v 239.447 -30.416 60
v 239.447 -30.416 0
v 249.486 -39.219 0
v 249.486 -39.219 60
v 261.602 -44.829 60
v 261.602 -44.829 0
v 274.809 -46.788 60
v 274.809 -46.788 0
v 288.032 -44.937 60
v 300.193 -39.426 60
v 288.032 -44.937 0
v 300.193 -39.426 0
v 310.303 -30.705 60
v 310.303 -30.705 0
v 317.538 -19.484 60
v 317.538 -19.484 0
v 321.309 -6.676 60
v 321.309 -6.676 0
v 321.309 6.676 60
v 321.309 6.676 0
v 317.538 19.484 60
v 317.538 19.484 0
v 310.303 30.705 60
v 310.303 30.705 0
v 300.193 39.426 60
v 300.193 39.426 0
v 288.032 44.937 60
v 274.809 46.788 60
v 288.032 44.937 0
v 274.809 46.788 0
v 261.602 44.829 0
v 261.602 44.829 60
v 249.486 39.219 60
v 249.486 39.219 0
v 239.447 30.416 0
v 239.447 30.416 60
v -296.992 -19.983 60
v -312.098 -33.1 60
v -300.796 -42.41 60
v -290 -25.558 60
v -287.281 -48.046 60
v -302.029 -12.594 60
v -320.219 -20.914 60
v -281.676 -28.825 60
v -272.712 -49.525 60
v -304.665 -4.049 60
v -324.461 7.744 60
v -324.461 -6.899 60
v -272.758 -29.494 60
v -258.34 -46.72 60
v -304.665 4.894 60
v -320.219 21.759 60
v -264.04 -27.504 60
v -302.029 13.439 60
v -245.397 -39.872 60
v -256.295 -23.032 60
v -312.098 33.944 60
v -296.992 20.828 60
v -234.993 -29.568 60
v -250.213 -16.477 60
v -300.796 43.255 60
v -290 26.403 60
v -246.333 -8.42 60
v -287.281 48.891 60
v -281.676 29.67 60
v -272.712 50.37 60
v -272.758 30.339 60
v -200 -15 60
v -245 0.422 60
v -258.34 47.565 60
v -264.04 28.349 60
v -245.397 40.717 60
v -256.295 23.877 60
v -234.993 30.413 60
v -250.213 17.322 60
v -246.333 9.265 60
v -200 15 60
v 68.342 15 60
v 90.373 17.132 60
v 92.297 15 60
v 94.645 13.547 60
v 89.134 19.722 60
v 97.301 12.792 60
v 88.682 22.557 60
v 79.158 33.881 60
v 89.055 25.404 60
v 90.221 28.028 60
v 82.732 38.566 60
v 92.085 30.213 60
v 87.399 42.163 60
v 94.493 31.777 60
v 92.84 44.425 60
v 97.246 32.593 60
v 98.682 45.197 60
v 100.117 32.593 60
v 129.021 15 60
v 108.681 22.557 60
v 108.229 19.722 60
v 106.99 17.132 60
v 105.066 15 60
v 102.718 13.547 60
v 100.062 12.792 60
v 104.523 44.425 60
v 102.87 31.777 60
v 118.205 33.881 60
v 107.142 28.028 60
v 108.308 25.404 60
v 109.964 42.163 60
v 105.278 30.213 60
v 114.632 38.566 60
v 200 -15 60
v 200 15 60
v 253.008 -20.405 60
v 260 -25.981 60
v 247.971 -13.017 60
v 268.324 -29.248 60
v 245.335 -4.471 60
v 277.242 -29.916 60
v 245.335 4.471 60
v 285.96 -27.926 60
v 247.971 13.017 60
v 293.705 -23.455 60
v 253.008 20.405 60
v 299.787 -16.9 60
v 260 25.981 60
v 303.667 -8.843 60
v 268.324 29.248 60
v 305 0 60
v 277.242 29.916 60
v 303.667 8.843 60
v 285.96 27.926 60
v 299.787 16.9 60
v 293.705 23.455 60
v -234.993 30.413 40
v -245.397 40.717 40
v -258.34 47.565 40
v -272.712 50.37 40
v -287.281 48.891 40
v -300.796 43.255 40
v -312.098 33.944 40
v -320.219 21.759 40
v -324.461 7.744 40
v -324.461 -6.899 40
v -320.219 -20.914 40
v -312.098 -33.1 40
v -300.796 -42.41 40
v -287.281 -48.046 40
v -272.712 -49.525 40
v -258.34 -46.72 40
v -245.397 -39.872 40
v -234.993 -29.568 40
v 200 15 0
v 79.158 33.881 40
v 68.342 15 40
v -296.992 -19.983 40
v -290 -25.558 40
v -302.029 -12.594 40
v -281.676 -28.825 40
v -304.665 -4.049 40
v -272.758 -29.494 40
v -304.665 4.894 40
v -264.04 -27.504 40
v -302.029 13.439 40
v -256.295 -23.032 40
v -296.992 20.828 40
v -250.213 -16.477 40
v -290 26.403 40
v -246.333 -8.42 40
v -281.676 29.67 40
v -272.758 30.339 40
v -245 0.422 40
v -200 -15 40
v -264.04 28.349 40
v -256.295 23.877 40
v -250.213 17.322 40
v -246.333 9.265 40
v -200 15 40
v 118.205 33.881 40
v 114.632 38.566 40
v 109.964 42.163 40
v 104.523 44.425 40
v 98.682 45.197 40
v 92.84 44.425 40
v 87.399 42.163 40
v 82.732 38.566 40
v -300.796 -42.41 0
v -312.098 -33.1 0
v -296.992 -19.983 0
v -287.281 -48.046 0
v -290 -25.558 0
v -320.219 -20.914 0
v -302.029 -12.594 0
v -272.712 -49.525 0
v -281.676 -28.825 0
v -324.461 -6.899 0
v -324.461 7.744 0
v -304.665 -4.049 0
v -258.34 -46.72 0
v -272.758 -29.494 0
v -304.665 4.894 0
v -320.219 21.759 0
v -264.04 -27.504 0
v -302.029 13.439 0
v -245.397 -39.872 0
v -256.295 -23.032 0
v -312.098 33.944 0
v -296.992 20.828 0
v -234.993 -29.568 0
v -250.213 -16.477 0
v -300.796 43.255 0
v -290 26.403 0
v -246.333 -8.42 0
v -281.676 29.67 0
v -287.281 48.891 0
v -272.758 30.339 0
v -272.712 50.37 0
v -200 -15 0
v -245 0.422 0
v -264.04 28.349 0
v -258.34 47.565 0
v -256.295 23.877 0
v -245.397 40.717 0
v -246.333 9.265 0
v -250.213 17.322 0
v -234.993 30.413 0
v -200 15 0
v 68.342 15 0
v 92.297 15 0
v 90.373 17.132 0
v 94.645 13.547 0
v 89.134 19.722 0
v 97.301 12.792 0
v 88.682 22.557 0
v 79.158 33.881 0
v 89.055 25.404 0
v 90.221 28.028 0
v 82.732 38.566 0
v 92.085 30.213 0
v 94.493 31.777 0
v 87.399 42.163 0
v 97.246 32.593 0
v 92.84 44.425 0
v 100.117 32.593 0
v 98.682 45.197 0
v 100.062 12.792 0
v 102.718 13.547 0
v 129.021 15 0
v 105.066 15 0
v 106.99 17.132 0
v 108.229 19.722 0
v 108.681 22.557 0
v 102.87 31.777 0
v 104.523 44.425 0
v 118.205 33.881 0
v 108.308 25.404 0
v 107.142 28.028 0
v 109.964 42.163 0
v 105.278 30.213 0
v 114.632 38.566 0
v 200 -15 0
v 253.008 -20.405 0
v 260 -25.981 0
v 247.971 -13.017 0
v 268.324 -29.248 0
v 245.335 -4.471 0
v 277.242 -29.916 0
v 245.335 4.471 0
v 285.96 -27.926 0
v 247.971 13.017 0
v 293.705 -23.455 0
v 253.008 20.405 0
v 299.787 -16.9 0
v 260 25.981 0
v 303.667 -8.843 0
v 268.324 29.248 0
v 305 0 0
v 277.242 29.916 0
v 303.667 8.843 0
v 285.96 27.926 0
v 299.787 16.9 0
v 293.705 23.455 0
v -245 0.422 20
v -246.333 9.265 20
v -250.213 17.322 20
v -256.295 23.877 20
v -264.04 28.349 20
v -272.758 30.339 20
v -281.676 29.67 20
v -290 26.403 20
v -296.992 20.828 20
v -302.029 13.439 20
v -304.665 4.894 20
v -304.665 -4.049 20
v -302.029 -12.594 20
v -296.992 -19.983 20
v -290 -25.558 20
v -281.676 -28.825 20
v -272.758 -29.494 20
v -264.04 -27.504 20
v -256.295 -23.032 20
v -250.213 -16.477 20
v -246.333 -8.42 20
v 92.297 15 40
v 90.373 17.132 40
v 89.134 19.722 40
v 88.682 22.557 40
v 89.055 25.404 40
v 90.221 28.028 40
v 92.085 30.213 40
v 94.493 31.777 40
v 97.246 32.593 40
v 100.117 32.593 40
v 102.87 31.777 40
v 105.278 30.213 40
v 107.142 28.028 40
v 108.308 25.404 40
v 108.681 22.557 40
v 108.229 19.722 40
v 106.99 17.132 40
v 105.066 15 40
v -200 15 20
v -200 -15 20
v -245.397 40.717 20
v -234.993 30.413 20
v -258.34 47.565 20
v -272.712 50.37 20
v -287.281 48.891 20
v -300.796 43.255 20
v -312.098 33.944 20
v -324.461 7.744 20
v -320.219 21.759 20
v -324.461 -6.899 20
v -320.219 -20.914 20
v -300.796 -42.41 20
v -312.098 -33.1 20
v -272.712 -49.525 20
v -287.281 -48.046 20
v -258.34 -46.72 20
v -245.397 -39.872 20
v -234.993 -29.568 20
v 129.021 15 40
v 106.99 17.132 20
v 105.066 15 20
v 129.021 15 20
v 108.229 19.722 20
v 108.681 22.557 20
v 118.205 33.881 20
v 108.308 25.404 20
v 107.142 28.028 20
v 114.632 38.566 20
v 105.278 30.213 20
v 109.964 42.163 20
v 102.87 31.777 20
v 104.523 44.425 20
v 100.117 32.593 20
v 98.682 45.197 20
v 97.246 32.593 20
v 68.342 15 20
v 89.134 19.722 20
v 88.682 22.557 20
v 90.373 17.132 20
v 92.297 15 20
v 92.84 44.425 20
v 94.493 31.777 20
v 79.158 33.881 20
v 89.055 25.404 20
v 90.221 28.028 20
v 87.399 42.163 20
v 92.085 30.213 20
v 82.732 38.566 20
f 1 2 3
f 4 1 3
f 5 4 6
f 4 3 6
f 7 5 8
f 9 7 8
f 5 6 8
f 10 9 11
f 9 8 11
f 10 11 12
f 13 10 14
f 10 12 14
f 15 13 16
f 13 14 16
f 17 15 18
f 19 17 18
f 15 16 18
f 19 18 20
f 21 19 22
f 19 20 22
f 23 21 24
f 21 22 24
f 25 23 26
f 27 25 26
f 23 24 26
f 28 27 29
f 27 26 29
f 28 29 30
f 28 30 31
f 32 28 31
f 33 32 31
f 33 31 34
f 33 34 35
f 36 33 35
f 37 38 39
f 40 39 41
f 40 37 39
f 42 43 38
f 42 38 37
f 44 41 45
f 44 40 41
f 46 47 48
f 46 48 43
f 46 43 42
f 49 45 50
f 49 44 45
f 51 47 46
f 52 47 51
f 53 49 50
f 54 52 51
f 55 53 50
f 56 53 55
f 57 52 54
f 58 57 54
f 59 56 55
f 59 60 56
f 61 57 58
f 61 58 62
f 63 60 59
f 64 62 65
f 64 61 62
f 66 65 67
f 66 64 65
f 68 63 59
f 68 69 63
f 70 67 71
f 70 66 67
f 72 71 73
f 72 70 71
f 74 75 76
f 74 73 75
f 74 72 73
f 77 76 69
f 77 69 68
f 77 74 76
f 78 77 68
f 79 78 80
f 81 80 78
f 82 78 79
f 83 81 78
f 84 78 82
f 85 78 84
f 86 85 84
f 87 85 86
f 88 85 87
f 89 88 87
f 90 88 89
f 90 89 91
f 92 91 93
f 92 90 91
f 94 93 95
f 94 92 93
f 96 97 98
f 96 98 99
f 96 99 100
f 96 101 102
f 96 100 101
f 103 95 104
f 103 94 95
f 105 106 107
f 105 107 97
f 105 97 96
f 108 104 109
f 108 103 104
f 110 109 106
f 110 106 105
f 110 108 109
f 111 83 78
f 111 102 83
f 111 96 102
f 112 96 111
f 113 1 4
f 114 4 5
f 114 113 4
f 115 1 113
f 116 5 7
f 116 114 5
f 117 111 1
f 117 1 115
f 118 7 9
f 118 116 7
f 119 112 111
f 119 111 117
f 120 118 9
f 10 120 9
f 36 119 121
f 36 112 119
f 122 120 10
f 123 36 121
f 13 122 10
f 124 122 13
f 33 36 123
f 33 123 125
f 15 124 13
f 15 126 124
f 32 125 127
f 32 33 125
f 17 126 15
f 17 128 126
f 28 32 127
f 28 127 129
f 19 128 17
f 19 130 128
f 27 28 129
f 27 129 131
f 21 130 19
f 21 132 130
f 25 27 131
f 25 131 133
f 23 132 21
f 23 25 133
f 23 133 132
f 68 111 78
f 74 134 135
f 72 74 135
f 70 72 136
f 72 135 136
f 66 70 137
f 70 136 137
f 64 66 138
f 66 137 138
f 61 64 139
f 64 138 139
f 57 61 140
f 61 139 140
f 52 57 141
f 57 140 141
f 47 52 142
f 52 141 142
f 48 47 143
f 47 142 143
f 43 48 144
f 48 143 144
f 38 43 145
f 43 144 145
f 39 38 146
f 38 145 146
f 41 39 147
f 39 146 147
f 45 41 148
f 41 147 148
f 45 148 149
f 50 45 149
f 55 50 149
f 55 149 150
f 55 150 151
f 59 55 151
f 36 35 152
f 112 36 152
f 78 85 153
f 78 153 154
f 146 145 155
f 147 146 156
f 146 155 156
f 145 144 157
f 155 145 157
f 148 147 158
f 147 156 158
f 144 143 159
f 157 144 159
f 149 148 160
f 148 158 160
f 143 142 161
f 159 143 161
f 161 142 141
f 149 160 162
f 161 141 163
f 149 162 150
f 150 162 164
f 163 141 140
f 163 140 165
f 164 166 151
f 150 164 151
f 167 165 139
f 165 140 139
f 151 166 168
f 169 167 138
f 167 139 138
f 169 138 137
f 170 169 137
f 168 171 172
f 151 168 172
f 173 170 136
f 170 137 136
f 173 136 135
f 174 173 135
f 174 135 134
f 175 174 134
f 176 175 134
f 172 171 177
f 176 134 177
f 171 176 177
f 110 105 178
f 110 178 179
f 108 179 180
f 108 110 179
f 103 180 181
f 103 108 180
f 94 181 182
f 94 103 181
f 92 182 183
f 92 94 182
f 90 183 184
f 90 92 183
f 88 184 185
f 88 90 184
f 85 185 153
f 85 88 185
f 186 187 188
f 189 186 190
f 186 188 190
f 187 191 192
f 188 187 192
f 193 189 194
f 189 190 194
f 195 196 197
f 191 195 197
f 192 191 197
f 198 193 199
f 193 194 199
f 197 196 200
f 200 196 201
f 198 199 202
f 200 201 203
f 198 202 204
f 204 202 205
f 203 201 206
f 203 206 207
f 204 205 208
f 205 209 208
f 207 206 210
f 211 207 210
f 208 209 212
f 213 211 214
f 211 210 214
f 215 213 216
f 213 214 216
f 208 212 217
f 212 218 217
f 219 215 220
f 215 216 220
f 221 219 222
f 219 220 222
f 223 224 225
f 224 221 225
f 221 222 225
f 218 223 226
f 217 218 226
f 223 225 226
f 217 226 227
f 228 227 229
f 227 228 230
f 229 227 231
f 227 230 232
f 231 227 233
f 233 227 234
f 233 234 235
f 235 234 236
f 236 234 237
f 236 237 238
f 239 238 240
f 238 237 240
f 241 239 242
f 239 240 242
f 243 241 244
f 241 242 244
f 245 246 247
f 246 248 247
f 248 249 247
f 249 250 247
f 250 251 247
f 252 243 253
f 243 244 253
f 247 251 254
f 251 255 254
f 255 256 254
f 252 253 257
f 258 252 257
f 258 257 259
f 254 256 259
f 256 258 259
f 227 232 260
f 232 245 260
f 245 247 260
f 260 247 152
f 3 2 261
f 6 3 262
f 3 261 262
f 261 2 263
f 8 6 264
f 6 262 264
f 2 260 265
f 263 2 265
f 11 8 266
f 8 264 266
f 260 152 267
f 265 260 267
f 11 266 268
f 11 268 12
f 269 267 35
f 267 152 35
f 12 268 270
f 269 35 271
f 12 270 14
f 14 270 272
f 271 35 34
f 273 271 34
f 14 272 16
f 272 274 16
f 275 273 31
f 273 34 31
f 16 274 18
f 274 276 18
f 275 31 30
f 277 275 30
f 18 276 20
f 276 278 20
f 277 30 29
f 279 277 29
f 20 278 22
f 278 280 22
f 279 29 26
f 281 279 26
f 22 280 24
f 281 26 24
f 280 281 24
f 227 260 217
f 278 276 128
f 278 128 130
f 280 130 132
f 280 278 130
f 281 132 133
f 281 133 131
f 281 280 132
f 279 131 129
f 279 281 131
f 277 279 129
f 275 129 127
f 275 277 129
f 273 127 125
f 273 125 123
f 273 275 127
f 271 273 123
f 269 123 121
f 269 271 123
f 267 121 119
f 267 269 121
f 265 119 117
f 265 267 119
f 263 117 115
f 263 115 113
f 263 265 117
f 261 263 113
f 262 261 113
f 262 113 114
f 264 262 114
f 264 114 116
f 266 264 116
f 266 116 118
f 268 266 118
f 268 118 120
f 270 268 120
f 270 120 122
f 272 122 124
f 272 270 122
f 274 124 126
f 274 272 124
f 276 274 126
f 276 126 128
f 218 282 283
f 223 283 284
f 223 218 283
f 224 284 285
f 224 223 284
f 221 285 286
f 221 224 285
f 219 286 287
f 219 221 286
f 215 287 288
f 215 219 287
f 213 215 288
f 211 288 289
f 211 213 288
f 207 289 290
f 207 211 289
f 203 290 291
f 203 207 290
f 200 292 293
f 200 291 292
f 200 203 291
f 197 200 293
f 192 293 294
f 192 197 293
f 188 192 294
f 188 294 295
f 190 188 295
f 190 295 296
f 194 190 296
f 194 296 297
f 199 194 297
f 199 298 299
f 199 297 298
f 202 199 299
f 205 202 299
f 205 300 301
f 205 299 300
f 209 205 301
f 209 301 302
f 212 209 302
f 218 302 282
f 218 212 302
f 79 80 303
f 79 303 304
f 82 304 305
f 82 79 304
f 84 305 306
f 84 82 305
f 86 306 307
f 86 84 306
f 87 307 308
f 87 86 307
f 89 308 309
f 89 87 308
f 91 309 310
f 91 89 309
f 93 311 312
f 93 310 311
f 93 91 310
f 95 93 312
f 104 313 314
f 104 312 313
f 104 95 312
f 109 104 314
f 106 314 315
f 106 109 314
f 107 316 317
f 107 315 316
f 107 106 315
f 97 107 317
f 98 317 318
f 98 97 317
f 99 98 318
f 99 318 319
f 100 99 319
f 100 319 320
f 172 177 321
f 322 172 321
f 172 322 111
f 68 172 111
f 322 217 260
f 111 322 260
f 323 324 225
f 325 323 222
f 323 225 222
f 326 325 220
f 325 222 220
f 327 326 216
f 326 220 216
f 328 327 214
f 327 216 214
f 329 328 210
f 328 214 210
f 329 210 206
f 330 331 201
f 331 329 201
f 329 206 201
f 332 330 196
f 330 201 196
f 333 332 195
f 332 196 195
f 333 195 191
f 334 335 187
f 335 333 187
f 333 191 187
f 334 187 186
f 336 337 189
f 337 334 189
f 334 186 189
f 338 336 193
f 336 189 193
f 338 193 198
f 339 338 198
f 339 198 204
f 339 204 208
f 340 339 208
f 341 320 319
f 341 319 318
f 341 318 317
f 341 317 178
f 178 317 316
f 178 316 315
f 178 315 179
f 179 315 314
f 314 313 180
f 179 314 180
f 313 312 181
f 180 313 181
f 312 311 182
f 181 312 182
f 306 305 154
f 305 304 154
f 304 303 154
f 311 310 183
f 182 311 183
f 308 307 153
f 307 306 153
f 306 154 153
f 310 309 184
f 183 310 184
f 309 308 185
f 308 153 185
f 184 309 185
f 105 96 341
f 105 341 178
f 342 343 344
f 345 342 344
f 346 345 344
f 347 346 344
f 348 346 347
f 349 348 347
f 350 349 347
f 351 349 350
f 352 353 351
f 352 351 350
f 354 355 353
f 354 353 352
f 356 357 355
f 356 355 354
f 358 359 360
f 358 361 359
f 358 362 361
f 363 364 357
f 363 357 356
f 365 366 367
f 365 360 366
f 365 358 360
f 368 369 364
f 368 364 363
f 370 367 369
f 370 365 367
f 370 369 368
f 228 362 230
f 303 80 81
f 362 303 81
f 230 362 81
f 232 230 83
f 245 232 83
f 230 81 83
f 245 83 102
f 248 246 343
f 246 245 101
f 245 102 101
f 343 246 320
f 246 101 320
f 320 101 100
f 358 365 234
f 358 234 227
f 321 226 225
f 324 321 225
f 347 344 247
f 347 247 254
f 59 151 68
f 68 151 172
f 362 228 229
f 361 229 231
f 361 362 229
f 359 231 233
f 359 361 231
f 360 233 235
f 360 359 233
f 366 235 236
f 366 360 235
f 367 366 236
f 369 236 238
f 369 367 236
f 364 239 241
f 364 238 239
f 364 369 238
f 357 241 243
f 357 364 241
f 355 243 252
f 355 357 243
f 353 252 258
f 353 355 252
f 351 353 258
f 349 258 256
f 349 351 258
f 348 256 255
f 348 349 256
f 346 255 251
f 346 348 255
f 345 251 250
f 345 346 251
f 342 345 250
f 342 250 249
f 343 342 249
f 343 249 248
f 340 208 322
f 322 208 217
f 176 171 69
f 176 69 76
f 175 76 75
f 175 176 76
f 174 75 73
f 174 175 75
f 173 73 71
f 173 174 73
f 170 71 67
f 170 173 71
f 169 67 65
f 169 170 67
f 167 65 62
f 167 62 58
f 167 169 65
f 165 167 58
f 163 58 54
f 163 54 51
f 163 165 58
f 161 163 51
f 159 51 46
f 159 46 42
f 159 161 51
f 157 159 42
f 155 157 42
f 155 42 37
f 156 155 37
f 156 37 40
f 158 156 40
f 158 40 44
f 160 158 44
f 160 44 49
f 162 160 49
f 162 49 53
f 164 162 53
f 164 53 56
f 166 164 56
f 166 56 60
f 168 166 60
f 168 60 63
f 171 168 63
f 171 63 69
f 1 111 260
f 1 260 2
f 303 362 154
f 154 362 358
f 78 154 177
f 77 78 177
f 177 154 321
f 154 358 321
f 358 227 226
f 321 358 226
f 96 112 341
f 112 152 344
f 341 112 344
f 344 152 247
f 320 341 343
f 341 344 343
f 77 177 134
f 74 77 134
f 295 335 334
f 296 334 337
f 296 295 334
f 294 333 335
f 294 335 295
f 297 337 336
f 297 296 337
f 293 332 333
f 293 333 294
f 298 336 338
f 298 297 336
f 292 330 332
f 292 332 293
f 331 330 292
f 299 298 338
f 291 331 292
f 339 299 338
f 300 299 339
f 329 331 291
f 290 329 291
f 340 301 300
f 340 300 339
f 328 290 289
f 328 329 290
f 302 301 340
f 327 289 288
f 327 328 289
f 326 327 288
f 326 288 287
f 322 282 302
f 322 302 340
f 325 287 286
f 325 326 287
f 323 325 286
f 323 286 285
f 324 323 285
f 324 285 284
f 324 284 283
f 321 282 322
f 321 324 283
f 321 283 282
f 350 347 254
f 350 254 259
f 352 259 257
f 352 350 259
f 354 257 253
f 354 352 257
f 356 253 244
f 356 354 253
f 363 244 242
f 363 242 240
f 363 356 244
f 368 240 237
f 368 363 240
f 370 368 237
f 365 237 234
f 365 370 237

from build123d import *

# Parameters (mm, degrees)
SKETCH1_R           = 30
BOSS_EXTRUDE1_DEPTH = 60
SKETCH2_W           = 125
SKETCH2_H           = 20
CUT_EXTRUDE1_DEPTH  = 70
BOSS_EXTRUDE2_DEPTH = 60
SKETCH4_R           = 10
CUT_EXTRUDE2_DEPTH  = 61
SKETCH5_W           = 20
SKETCH5_H           = 30.196617065
CUT_EXTRUDE3_DEPTH  = 350


with BuildPart() as part:
    # Sketch1 → Boss-Extrude1 (new body)
    with BuildSketch(Plane.XY):
        with BuildLine():
            Line((200, 15), (-200, 15))
            Line((-200, 15), (-234.992965725, 30.413109921))
            ThreePointArc((-234.992965725, 30.413109921), (-325, 0.422491245), (-234.992965725, -29.568127431))
            Line((-234.992965725, -29.568127431), (-200, -15))
            Line((-200, -15), (200, -15))
            Line((200, -15), (239.447282721, -30.416066909))
            ThreePointArc((239.447282721, -30.416066909), (321.788169788, 0), (239.447282721, 30.416066909))
            Line((239.447282721, 30.416066909), (200, 15))
        make_face()
        with Locations((-275, 0.422491245)):
            Circle(SKETCH1_R, mode=Mode.SUBTRACT)
        with Locations((275, 0)):
            Circle(SKETCH1_R, mode=Mode.SUBTRACT)
    extrude(amount=BOSS_EXTRUDE1_DEPTH)

    # Sketch2 → Cut-Extrude1 (cut, symmetric)
    with BuildSketch(Plane(origin=(0, 15, 0), x_dir=(1, 0, 0), z_dir=(0, 1, 0))):
        with Locations((-262.5, -30)):
            Rectangle(SKETCH2_W, SKETCH2_H)
    extrude(amount=CUT_EXTRUDE1_DEPTH, both=True, mode=Mode.SUBTRACT)

    # Sketch3 → Boss-Extrude2 (add)
    with BuildSketch(Plane.XY.offset(60)):
        with BuildLine():
            ThreePointArc((118.204825436, 33.881006124), (98.681520352, 45.196617065), (79.158215269, 33.881006124))
            ThreePointArc((79.158215269, 33.881006124), (76.263820119, 24.619301704), (77.538860024, 15))
            Line((77.538860024, 15), (92.297001125, 15))
            ThreePointArc((92.297001125, 15), (98.681520352, 32.696617065), (105.066039579, 15))
            Line((105.066039579, 15), (119.824180681, 15))
            ThreePointArc((119.824180681, 15), (121.099220586, 24.619301704), (118.204825436, 33.881006124))
        make_face()
        with BuildLine():
            ThreePointArc((77.538860024, 15), (76.263820119, 24.619301704), (79.158215269, 33.881006124))
            Line((79.158215269, 33.881006124), (68.341782426, 15))
            Line((68.341782426, 15), (77.538860024, 15))
        make_face()
        with BuildLine():
            Line((129.021258279, 15), (118.204825436, 33.881006124))
            ThreePointArc((118.204825436, 33.881006124), (121.099220586, 24.619301704), (119.824180681, 15))
            Line((119.824180681, 15), (129.021258279, 15))
        make_face()
    extrude(amount=-BOSS_EXTRUDE2_DEPTH)

    # Sketch4 → Cut-Extrude2 (cut, through all)
    with BuildSketch(Plane.XY.offset(60)):
        with Locations((98.681520352, 22.696617065)):
            Circle(SKETCH4_R)
    extrude(amount=-CUT_EXTRUDE2_DEPTH, mode=Mode.SUBTRACT)

    # Sketch5 → Cut-Extrude3 (cut)
    with BuildSketch(Plane.ZY.offset(200)):
        with Locations((30, 30.098308533)):
            Rectangle(SKETCH5_W, SKETCH5_H)
    extrude(amount=-CUT_EXTRUDE3_DEPTH, mode=Mode.SUBTRACT)


solid = part.part
